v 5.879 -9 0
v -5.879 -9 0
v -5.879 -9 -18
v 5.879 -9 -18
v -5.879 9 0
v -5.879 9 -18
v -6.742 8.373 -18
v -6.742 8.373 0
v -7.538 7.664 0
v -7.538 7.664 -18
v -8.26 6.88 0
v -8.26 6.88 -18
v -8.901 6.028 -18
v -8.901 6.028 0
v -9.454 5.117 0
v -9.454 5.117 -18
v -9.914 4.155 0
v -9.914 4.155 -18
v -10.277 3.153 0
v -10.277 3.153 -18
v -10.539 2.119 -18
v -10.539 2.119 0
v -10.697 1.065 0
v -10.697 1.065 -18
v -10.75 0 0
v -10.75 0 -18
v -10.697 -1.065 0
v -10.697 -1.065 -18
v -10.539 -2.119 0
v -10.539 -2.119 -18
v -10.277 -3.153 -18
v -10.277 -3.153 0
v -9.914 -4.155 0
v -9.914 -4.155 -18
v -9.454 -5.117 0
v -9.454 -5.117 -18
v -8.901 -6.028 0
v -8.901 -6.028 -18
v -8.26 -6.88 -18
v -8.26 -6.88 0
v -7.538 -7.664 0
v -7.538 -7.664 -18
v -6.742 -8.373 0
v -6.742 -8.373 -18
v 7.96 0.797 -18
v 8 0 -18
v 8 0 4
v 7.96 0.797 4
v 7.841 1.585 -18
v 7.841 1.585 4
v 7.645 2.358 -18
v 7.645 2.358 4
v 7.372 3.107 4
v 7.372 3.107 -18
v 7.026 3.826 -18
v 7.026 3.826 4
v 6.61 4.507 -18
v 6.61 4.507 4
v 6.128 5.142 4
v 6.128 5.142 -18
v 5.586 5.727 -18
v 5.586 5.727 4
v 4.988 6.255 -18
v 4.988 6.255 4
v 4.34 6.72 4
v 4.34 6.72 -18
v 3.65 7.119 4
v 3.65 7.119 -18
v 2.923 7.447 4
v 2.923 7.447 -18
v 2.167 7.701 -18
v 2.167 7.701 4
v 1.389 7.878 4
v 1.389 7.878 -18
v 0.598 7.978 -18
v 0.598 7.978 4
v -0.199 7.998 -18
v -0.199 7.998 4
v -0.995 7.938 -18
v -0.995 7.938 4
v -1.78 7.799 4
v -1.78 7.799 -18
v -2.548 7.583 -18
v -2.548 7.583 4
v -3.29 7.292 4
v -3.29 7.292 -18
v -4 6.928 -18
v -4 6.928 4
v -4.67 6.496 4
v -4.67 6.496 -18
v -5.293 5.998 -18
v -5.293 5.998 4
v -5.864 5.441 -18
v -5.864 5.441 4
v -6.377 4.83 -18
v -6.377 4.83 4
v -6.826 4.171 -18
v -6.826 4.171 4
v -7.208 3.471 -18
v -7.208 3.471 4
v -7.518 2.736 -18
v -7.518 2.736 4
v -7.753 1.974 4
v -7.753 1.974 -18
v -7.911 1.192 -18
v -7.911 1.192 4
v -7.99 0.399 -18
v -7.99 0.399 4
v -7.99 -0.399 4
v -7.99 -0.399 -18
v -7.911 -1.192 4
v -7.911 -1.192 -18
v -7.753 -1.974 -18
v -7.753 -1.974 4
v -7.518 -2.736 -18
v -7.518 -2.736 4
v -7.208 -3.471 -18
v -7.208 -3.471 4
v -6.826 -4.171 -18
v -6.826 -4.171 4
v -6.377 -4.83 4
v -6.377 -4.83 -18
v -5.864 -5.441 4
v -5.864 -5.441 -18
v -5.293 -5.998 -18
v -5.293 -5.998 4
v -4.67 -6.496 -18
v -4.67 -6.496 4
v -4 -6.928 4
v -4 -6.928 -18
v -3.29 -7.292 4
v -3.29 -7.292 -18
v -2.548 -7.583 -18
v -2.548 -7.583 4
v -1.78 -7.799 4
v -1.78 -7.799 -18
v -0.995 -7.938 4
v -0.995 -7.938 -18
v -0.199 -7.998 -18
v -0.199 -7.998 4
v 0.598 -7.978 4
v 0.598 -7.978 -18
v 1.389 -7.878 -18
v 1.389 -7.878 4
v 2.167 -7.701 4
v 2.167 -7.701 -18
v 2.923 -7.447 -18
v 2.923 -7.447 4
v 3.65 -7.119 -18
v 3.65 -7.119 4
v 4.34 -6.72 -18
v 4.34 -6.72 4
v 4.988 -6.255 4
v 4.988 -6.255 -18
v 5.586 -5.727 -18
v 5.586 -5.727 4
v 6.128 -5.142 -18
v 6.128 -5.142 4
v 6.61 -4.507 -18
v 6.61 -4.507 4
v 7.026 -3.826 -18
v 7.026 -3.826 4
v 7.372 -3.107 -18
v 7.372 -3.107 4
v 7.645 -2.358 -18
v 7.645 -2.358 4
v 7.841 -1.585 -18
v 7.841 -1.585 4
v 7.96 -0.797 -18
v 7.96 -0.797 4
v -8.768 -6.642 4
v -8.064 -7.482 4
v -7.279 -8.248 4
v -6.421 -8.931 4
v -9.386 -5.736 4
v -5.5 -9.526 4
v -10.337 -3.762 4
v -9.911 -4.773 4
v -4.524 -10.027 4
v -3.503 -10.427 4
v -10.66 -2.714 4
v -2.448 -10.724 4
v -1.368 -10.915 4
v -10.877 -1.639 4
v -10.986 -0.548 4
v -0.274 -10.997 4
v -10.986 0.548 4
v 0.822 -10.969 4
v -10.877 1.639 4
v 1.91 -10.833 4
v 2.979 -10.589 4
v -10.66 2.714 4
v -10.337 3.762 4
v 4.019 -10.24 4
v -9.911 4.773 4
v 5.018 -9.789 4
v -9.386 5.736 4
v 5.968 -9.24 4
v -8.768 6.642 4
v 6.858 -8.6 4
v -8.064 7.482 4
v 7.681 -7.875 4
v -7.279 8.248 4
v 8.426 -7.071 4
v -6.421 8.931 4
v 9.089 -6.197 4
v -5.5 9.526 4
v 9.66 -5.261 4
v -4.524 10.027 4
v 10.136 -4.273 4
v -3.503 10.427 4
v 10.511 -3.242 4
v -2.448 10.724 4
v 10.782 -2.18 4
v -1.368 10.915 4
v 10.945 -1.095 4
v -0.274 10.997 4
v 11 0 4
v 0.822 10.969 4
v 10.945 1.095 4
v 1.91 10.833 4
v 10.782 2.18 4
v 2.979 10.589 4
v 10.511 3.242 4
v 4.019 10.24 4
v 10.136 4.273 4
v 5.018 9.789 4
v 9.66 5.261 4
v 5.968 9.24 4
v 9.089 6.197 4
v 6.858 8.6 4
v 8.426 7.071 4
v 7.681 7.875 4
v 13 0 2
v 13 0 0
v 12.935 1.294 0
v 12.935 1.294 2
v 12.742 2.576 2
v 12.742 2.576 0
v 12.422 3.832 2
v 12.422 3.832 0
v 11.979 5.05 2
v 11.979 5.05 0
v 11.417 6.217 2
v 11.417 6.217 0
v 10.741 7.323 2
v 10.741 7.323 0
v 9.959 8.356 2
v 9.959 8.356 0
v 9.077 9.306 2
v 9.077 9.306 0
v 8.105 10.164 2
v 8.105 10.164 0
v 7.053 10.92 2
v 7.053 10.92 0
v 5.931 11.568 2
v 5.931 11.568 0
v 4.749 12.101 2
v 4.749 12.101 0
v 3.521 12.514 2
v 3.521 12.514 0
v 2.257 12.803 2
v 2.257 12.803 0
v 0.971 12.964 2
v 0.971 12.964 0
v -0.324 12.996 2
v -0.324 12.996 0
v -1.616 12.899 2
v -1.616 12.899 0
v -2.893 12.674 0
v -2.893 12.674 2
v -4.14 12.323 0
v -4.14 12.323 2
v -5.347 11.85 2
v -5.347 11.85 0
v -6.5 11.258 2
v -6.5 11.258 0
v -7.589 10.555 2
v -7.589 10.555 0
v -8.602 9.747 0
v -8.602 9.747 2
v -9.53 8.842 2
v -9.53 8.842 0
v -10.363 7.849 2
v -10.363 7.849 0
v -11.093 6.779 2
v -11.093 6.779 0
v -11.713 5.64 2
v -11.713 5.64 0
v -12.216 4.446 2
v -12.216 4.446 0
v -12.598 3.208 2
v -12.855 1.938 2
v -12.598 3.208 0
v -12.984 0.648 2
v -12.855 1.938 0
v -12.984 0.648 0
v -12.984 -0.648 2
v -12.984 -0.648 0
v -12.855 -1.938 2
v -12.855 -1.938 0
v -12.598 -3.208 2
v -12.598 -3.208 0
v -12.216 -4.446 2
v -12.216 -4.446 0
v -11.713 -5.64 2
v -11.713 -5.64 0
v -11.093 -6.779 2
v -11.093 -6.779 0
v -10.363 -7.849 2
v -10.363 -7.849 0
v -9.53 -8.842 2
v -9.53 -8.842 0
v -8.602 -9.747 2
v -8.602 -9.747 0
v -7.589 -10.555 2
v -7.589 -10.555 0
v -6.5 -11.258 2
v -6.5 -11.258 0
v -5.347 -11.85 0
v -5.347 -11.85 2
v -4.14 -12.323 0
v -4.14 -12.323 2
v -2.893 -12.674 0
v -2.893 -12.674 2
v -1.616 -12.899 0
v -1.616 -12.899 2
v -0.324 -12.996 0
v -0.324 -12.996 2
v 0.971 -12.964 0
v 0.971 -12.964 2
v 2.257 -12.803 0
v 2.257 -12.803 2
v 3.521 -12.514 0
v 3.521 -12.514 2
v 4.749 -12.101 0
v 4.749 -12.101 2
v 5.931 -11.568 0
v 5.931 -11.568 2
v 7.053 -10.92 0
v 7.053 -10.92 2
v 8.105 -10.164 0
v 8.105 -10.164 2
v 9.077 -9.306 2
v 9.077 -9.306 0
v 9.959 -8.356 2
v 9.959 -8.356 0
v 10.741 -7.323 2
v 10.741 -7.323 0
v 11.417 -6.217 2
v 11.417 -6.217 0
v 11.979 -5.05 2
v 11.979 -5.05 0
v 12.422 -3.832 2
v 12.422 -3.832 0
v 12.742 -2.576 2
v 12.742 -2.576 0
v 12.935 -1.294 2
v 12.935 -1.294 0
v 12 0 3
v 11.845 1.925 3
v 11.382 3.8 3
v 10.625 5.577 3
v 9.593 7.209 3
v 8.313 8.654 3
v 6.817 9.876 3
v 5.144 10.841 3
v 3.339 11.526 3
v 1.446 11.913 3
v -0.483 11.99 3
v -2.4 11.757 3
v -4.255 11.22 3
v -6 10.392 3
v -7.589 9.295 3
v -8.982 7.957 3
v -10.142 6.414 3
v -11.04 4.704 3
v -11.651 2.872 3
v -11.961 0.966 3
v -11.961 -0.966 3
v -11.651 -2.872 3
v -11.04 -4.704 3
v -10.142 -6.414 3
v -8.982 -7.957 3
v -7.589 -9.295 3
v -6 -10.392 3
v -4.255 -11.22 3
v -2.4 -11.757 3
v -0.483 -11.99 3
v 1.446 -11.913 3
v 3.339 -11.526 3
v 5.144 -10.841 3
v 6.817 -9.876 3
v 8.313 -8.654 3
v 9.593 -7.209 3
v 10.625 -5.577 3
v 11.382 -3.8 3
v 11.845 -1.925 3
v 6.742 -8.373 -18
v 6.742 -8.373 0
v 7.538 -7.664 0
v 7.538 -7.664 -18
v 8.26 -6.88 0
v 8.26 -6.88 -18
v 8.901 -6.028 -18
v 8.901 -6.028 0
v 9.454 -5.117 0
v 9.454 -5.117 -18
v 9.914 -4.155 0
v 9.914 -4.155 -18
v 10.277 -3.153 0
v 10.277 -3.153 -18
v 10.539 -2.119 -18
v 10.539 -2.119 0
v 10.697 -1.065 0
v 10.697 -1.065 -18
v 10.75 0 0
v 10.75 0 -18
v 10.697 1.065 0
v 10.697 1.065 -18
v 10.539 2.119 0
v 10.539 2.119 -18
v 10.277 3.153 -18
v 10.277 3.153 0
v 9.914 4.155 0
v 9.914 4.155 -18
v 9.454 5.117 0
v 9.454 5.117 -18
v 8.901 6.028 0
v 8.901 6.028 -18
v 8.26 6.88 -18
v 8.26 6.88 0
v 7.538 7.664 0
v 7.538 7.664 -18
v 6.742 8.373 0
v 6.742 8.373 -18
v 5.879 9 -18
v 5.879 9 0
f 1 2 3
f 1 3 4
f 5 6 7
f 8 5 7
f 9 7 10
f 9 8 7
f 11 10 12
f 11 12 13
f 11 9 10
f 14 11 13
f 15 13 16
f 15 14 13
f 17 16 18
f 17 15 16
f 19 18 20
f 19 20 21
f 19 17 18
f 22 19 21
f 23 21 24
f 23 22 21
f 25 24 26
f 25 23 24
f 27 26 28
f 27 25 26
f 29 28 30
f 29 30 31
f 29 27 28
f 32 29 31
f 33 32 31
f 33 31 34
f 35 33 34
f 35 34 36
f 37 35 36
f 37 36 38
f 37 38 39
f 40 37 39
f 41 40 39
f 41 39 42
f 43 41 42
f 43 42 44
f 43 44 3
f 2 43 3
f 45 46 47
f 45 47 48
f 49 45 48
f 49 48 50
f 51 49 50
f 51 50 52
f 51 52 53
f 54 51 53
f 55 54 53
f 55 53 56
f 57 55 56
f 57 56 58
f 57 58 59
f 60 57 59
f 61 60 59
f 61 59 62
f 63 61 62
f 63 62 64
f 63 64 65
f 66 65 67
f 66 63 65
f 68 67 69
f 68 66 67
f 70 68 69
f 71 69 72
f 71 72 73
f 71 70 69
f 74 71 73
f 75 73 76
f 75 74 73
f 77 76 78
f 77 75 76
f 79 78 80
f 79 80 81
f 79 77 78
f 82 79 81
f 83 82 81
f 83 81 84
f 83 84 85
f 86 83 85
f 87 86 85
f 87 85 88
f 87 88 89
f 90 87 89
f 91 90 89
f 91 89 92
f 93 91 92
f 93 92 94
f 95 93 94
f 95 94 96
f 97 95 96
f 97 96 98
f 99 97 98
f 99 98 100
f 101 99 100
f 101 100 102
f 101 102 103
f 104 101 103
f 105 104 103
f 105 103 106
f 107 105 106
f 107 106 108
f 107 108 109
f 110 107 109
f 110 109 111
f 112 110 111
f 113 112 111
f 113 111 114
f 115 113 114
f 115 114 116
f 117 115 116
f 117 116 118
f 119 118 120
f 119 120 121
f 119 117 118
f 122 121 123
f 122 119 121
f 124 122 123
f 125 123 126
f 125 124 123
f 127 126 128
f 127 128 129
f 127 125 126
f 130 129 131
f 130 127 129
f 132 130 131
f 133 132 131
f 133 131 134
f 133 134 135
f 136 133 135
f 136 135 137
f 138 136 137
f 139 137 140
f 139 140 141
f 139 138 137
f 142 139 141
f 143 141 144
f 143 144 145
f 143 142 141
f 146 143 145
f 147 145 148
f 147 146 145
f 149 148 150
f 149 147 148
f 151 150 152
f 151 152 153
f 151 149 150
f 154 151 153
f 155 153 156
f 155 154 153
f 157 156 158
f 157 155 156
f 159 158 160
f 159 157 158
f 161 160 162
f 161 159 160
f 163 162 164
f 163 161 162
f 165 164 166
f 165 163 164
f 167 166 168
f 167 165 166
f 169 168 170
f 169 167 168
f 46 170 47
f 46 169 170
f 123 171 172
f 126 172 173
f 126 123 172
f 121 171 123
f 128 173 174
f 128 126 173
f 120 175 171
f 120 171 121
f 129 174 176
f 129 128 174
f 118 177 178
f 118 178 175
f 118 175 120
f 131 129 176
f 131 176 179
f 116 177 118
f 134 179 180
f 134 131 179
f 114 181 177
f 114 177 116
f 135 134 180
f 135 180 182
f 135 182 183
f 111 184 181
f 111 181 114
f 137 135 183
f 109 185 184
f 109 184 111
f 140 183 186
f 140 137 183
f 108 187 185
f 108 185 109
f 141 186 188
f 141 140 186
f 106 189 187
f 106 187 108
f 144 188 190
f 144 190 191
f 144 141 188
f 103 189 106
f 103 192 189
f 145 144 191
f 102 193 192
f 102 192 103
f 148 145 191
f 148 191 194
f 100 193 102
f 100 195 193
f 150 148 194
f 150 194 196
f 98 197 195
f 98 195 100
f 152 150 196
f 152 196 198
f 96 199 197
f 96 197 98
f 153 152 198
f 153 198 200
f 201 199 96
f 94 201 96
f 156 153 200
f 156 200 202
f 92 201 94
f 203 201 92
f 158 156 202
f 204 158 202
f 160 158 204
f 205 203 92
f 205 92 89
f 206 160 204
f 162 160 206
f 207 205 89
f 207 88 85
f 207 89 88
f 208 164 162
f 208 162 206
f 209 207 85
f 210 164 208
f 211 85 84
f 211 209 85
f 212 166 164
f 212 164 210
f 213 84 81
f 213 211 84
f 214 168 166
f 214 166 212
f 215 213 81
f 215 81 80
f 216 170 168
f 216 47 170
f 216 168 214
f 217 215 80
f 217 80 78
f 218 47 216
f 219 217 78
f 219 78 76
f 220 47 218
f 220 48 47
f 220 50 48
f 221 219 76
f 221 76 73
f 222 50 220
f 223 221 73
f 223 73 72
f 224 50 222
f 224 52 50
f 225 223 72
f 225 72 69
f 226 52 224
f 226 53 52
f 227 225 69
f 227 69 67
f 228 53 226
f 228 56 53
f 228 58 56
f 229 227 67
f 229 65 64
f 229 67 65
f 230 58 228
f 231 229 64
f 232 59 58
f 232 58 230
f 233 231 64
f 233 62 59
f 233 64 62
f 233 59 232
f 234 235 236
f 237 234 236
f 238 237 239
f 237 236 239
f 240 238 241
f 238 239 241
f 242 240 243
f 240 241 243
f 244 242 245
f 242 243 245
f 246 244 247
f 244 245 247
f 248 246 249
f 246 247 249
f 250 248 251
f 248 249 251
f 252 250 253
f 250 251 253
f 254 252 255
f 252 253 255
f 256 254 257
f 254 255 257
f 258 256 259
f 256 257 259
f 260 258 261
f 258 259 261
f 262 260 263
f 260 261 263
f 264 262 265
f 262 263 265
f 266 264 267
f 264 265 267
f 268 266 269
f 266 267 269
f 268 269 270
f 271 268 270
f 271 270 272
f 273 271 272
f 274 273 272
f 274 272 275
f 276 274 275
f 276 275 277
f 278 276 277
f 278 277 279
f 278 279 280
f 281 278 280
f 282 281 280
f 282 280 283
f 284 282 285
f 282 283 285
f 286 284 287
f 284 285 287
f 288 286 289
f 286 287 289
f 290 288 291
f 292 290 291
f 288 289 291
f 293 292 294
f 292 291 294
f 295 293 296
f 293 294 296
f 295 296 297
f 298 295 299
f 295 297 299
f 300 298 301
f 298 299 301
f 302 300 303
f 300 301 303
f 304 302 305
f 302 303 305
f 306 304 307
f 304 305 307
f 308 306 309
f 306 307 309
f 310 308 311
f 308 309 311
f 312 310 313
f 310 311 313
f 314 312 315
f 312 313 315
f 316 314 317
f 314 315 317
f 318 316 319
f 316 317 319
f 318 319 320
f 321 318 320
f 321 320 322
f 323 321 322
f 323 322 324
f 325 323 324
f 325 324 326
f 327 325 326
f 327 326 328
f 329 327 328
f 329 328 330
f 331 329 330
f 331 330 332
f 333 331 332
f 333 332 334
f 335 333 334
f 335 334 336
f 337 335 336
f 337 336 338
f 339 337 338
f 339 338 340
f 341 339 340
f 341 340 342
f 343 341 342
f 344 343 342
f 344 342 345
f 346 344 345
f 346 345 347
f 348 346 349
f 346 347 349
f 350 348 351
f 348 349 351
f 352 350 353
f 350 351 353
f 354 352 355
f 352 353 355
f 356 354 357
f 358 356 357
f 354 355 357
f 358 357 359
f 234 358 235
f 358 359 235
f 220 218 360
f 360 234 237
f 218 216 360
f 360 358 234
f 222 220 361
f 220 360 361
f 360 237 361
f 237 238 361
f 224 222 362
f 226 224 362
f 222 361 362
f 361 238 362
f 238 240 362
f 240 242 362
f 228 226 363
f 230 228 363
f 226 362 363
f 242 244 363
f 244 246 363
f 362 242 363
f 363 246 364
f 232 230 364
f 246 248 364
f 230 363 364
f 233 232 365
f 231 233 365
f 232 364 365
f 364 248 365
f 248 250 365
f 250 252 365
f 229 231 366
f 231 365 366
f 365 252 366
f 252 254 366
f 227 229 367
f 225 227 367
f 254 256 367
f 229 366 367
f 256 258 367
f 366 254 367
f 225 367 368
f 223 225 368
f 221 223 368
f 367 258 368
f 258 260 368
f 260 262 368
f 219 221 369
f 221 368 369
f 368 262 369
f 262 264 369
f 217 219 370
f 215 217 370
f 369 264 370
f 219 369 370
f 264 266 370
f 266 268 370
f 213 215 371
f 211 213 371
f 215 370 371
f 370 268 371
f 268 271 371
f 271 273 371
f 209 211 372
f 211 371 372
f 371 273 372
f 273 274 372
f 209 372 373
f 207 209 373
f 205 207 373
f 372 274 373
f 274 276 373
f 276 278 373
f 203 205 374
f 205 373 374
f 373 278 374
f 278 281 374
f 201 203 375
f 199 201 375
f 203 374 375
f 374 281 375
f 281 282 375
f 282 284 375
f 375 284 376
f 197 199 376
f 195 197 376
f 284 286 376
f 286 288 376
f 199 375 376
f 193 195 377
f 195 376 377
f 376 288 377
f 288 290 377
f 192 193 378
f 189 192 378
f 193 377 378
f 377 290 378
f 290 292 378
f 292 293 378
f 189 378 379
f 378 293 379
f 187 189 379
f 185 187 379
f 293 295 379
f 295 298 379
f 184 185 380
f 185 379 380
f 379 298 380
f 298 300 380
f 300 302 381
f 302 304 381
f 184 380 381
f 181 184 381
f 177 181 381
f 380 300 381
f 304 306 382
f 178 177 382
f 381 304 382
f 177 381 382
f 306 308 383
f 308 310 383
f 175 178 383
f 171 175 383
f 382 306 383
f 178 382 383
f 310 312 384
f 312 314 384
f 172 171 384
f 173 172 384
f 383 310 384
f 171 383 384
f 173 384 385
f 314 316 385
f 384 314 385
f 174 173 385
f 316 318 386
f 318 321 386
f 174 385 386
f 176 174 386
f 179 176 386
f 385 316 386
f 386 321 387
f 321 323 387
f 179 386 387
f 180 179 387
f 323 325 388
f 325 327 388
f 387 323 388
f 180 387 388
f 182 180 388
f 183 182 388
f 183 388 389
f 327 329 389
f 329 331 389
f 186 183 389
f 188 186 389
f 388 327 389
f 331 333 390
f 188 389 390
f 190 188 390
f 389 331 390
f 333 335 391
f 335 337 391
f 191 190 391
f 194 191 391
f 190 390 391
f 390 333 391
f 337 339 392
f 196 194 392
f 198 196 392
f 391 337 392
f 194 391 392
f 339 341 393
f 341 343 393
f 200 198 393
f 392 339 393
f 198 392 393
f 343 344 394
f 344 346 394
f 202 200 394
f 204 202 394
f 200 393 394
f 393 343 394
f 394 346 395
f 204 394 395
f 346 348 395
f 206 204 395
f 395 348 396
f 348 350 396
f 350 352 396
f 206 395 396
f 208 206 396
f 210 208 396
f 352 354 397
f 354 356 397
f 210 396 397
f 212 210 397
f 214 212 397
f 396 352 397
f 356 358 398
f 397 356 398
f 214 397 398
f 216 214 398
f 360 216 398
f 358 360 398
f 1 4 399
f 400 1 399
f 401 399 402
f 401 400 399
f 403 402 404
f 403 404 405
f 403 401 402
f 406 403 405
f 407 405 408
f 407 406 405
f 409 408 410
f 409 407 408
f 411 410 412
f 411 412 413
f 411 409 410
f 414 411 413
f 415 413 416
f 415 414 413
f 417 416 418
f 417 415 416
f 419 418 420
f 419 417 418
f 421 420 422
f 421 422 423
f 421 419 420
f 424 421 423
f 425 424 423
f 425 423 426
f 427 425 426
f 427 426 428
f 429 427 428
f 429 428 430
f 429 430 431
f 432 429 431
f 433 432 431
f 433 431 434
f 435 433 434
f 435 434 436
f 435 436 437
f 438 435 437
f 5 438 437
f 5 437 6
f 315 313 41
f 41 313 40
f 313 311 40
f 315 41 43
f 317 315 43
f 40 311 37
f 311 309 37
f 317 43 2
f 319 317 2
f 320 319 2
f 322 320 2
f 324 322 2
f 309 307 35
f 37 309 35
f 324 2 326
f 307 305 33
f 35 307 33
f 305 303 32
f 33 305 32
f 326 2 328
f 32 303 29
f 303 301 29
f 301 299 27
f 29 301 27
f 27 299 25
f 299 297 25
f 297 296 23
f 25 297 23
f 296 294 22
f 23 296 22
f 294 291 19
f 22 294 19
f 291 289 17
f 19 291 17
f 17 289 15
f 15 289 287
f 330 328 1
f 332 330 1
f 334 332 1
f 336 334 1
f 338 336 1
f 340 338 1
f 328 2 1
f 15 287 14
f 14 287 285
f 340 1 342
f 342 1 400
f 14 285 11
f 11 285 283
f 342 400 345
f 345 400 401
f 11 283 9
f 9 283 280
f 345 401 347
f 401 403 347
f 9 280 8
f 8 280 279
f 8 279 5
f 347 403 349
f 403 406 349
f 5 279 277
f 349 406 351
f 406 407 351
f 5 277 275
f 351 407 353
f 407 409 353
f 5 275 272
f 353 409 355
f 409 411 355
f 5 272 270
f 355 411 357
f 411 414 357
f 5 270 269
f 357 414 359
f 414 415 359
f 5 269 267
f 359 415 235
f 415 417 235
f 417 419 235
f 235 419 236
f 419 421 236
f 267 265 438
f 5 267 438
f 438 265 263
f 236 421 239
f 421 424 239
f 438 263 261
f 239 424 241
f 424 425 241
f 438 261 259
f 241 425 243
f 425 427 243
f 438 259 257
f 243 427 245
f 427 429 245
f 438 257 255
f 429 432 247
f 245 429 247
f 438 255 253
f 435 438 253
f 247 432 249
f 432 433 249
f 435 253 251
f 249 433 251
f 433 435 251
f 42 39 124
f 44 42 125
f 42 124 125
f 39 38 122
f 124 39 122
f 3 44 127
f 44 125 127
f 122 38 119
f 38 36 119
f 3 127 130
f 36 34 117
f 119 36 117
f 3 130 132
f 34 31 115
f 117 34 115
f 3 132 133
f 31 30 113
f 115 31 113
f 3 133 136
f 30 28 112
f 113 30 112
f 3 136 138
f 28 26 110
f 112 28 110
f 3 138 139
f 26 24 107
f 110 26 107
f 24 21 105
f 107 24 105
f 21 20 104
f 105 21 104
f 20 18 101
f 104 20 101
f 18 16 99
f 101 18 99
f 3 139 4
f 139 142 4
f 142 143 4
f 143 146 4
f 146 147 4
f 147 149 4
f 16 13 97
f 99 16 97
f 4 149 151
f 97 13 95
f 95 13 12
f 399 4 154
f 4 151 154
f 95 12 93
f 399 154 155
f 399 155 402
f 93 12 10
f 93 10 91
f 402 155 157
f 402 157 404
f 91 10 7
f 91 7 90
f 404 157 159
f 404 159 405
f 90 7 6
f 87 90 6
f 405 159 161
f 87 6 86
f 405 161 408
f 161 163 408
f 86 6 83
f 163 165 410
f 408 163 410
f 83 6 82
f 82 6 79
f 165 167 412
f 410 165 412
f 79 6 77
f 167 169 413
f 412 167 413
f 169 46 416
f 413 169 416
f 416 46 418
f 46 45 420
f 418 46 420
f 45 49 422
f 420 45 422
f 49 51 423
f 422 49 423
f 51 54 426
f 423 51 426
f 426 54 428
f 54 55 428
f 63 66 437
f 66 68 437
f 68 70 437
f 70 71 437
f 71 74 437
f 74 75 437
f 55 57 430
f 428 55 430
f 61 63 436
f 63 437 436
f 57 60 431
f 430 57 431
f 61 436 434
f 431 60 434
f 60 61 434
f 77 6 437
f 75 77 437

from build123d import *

# Parameters (mm, degrees)
SKETCH1_R           = 13
SKETCH1_R_2         = 8
BOSS_EXTRUDE1_DEPTH = 4
BOSS_EXTRUDE2_DEPTH = 18
CUT_EXTRUDE1_START  = -18
SKETCH3_R           = 8
CUT_EXTRUDE1_DEPTH  = 18
CHAMFER1_SIZE       = 2


with BuildPart() as part:
    # Sketch1 → Boss-Extrude1 (new body)
    with BuildSketch(Plane.XY):
        Circle(SKETCH1_R)
        Circle(SKETCH1_R_2, mode=Mode.SUBTRACT)
    extrude(amount=BOSS_EXTRUDE1_DEPTH)

    # Sketch2 → Boss-Extrude2 (add)
    with BuildSketch(Plane(origin=(0, 0, 0), x_dir=(-1, 0, 0), z_dir=(0, 0, -1))):
        with BuildLine():
            Line((-5.878988008, 9), (5.878988008, 9))
            ThreePointArc((5.878988008, 9), (10.75, 0), (5.878988008, -9))
            Line((5.878988008, -9), (-5.878988008, -9))
            ThreePointArc((-5.878988008, -9), (-10.75, 0), (-5.878988008, 9))
        make_face()
    extrude(amount=BOSS_EXTRUDE2_DEPTH)

    # Sketch3 → Cut-Extrude1 (cut)
    with BuildSketch(Plane.XY.offset(CUT_EXTRUDE1_START)):
        Circle(SKETCH3_R)
    extrude(amount=CUT_EXTRUDE1_DEPTH, mode=Mode.SUBTRACT)

    # Chamfer1
    chamfer1_edges = [part.edges().sort_by_distance(p)[0] for p in [
        (-13, 0, 4),
    ]]
    chamfer(chamfer1_edges, length=CHAMFER1_SIZE)


solid = part.part
